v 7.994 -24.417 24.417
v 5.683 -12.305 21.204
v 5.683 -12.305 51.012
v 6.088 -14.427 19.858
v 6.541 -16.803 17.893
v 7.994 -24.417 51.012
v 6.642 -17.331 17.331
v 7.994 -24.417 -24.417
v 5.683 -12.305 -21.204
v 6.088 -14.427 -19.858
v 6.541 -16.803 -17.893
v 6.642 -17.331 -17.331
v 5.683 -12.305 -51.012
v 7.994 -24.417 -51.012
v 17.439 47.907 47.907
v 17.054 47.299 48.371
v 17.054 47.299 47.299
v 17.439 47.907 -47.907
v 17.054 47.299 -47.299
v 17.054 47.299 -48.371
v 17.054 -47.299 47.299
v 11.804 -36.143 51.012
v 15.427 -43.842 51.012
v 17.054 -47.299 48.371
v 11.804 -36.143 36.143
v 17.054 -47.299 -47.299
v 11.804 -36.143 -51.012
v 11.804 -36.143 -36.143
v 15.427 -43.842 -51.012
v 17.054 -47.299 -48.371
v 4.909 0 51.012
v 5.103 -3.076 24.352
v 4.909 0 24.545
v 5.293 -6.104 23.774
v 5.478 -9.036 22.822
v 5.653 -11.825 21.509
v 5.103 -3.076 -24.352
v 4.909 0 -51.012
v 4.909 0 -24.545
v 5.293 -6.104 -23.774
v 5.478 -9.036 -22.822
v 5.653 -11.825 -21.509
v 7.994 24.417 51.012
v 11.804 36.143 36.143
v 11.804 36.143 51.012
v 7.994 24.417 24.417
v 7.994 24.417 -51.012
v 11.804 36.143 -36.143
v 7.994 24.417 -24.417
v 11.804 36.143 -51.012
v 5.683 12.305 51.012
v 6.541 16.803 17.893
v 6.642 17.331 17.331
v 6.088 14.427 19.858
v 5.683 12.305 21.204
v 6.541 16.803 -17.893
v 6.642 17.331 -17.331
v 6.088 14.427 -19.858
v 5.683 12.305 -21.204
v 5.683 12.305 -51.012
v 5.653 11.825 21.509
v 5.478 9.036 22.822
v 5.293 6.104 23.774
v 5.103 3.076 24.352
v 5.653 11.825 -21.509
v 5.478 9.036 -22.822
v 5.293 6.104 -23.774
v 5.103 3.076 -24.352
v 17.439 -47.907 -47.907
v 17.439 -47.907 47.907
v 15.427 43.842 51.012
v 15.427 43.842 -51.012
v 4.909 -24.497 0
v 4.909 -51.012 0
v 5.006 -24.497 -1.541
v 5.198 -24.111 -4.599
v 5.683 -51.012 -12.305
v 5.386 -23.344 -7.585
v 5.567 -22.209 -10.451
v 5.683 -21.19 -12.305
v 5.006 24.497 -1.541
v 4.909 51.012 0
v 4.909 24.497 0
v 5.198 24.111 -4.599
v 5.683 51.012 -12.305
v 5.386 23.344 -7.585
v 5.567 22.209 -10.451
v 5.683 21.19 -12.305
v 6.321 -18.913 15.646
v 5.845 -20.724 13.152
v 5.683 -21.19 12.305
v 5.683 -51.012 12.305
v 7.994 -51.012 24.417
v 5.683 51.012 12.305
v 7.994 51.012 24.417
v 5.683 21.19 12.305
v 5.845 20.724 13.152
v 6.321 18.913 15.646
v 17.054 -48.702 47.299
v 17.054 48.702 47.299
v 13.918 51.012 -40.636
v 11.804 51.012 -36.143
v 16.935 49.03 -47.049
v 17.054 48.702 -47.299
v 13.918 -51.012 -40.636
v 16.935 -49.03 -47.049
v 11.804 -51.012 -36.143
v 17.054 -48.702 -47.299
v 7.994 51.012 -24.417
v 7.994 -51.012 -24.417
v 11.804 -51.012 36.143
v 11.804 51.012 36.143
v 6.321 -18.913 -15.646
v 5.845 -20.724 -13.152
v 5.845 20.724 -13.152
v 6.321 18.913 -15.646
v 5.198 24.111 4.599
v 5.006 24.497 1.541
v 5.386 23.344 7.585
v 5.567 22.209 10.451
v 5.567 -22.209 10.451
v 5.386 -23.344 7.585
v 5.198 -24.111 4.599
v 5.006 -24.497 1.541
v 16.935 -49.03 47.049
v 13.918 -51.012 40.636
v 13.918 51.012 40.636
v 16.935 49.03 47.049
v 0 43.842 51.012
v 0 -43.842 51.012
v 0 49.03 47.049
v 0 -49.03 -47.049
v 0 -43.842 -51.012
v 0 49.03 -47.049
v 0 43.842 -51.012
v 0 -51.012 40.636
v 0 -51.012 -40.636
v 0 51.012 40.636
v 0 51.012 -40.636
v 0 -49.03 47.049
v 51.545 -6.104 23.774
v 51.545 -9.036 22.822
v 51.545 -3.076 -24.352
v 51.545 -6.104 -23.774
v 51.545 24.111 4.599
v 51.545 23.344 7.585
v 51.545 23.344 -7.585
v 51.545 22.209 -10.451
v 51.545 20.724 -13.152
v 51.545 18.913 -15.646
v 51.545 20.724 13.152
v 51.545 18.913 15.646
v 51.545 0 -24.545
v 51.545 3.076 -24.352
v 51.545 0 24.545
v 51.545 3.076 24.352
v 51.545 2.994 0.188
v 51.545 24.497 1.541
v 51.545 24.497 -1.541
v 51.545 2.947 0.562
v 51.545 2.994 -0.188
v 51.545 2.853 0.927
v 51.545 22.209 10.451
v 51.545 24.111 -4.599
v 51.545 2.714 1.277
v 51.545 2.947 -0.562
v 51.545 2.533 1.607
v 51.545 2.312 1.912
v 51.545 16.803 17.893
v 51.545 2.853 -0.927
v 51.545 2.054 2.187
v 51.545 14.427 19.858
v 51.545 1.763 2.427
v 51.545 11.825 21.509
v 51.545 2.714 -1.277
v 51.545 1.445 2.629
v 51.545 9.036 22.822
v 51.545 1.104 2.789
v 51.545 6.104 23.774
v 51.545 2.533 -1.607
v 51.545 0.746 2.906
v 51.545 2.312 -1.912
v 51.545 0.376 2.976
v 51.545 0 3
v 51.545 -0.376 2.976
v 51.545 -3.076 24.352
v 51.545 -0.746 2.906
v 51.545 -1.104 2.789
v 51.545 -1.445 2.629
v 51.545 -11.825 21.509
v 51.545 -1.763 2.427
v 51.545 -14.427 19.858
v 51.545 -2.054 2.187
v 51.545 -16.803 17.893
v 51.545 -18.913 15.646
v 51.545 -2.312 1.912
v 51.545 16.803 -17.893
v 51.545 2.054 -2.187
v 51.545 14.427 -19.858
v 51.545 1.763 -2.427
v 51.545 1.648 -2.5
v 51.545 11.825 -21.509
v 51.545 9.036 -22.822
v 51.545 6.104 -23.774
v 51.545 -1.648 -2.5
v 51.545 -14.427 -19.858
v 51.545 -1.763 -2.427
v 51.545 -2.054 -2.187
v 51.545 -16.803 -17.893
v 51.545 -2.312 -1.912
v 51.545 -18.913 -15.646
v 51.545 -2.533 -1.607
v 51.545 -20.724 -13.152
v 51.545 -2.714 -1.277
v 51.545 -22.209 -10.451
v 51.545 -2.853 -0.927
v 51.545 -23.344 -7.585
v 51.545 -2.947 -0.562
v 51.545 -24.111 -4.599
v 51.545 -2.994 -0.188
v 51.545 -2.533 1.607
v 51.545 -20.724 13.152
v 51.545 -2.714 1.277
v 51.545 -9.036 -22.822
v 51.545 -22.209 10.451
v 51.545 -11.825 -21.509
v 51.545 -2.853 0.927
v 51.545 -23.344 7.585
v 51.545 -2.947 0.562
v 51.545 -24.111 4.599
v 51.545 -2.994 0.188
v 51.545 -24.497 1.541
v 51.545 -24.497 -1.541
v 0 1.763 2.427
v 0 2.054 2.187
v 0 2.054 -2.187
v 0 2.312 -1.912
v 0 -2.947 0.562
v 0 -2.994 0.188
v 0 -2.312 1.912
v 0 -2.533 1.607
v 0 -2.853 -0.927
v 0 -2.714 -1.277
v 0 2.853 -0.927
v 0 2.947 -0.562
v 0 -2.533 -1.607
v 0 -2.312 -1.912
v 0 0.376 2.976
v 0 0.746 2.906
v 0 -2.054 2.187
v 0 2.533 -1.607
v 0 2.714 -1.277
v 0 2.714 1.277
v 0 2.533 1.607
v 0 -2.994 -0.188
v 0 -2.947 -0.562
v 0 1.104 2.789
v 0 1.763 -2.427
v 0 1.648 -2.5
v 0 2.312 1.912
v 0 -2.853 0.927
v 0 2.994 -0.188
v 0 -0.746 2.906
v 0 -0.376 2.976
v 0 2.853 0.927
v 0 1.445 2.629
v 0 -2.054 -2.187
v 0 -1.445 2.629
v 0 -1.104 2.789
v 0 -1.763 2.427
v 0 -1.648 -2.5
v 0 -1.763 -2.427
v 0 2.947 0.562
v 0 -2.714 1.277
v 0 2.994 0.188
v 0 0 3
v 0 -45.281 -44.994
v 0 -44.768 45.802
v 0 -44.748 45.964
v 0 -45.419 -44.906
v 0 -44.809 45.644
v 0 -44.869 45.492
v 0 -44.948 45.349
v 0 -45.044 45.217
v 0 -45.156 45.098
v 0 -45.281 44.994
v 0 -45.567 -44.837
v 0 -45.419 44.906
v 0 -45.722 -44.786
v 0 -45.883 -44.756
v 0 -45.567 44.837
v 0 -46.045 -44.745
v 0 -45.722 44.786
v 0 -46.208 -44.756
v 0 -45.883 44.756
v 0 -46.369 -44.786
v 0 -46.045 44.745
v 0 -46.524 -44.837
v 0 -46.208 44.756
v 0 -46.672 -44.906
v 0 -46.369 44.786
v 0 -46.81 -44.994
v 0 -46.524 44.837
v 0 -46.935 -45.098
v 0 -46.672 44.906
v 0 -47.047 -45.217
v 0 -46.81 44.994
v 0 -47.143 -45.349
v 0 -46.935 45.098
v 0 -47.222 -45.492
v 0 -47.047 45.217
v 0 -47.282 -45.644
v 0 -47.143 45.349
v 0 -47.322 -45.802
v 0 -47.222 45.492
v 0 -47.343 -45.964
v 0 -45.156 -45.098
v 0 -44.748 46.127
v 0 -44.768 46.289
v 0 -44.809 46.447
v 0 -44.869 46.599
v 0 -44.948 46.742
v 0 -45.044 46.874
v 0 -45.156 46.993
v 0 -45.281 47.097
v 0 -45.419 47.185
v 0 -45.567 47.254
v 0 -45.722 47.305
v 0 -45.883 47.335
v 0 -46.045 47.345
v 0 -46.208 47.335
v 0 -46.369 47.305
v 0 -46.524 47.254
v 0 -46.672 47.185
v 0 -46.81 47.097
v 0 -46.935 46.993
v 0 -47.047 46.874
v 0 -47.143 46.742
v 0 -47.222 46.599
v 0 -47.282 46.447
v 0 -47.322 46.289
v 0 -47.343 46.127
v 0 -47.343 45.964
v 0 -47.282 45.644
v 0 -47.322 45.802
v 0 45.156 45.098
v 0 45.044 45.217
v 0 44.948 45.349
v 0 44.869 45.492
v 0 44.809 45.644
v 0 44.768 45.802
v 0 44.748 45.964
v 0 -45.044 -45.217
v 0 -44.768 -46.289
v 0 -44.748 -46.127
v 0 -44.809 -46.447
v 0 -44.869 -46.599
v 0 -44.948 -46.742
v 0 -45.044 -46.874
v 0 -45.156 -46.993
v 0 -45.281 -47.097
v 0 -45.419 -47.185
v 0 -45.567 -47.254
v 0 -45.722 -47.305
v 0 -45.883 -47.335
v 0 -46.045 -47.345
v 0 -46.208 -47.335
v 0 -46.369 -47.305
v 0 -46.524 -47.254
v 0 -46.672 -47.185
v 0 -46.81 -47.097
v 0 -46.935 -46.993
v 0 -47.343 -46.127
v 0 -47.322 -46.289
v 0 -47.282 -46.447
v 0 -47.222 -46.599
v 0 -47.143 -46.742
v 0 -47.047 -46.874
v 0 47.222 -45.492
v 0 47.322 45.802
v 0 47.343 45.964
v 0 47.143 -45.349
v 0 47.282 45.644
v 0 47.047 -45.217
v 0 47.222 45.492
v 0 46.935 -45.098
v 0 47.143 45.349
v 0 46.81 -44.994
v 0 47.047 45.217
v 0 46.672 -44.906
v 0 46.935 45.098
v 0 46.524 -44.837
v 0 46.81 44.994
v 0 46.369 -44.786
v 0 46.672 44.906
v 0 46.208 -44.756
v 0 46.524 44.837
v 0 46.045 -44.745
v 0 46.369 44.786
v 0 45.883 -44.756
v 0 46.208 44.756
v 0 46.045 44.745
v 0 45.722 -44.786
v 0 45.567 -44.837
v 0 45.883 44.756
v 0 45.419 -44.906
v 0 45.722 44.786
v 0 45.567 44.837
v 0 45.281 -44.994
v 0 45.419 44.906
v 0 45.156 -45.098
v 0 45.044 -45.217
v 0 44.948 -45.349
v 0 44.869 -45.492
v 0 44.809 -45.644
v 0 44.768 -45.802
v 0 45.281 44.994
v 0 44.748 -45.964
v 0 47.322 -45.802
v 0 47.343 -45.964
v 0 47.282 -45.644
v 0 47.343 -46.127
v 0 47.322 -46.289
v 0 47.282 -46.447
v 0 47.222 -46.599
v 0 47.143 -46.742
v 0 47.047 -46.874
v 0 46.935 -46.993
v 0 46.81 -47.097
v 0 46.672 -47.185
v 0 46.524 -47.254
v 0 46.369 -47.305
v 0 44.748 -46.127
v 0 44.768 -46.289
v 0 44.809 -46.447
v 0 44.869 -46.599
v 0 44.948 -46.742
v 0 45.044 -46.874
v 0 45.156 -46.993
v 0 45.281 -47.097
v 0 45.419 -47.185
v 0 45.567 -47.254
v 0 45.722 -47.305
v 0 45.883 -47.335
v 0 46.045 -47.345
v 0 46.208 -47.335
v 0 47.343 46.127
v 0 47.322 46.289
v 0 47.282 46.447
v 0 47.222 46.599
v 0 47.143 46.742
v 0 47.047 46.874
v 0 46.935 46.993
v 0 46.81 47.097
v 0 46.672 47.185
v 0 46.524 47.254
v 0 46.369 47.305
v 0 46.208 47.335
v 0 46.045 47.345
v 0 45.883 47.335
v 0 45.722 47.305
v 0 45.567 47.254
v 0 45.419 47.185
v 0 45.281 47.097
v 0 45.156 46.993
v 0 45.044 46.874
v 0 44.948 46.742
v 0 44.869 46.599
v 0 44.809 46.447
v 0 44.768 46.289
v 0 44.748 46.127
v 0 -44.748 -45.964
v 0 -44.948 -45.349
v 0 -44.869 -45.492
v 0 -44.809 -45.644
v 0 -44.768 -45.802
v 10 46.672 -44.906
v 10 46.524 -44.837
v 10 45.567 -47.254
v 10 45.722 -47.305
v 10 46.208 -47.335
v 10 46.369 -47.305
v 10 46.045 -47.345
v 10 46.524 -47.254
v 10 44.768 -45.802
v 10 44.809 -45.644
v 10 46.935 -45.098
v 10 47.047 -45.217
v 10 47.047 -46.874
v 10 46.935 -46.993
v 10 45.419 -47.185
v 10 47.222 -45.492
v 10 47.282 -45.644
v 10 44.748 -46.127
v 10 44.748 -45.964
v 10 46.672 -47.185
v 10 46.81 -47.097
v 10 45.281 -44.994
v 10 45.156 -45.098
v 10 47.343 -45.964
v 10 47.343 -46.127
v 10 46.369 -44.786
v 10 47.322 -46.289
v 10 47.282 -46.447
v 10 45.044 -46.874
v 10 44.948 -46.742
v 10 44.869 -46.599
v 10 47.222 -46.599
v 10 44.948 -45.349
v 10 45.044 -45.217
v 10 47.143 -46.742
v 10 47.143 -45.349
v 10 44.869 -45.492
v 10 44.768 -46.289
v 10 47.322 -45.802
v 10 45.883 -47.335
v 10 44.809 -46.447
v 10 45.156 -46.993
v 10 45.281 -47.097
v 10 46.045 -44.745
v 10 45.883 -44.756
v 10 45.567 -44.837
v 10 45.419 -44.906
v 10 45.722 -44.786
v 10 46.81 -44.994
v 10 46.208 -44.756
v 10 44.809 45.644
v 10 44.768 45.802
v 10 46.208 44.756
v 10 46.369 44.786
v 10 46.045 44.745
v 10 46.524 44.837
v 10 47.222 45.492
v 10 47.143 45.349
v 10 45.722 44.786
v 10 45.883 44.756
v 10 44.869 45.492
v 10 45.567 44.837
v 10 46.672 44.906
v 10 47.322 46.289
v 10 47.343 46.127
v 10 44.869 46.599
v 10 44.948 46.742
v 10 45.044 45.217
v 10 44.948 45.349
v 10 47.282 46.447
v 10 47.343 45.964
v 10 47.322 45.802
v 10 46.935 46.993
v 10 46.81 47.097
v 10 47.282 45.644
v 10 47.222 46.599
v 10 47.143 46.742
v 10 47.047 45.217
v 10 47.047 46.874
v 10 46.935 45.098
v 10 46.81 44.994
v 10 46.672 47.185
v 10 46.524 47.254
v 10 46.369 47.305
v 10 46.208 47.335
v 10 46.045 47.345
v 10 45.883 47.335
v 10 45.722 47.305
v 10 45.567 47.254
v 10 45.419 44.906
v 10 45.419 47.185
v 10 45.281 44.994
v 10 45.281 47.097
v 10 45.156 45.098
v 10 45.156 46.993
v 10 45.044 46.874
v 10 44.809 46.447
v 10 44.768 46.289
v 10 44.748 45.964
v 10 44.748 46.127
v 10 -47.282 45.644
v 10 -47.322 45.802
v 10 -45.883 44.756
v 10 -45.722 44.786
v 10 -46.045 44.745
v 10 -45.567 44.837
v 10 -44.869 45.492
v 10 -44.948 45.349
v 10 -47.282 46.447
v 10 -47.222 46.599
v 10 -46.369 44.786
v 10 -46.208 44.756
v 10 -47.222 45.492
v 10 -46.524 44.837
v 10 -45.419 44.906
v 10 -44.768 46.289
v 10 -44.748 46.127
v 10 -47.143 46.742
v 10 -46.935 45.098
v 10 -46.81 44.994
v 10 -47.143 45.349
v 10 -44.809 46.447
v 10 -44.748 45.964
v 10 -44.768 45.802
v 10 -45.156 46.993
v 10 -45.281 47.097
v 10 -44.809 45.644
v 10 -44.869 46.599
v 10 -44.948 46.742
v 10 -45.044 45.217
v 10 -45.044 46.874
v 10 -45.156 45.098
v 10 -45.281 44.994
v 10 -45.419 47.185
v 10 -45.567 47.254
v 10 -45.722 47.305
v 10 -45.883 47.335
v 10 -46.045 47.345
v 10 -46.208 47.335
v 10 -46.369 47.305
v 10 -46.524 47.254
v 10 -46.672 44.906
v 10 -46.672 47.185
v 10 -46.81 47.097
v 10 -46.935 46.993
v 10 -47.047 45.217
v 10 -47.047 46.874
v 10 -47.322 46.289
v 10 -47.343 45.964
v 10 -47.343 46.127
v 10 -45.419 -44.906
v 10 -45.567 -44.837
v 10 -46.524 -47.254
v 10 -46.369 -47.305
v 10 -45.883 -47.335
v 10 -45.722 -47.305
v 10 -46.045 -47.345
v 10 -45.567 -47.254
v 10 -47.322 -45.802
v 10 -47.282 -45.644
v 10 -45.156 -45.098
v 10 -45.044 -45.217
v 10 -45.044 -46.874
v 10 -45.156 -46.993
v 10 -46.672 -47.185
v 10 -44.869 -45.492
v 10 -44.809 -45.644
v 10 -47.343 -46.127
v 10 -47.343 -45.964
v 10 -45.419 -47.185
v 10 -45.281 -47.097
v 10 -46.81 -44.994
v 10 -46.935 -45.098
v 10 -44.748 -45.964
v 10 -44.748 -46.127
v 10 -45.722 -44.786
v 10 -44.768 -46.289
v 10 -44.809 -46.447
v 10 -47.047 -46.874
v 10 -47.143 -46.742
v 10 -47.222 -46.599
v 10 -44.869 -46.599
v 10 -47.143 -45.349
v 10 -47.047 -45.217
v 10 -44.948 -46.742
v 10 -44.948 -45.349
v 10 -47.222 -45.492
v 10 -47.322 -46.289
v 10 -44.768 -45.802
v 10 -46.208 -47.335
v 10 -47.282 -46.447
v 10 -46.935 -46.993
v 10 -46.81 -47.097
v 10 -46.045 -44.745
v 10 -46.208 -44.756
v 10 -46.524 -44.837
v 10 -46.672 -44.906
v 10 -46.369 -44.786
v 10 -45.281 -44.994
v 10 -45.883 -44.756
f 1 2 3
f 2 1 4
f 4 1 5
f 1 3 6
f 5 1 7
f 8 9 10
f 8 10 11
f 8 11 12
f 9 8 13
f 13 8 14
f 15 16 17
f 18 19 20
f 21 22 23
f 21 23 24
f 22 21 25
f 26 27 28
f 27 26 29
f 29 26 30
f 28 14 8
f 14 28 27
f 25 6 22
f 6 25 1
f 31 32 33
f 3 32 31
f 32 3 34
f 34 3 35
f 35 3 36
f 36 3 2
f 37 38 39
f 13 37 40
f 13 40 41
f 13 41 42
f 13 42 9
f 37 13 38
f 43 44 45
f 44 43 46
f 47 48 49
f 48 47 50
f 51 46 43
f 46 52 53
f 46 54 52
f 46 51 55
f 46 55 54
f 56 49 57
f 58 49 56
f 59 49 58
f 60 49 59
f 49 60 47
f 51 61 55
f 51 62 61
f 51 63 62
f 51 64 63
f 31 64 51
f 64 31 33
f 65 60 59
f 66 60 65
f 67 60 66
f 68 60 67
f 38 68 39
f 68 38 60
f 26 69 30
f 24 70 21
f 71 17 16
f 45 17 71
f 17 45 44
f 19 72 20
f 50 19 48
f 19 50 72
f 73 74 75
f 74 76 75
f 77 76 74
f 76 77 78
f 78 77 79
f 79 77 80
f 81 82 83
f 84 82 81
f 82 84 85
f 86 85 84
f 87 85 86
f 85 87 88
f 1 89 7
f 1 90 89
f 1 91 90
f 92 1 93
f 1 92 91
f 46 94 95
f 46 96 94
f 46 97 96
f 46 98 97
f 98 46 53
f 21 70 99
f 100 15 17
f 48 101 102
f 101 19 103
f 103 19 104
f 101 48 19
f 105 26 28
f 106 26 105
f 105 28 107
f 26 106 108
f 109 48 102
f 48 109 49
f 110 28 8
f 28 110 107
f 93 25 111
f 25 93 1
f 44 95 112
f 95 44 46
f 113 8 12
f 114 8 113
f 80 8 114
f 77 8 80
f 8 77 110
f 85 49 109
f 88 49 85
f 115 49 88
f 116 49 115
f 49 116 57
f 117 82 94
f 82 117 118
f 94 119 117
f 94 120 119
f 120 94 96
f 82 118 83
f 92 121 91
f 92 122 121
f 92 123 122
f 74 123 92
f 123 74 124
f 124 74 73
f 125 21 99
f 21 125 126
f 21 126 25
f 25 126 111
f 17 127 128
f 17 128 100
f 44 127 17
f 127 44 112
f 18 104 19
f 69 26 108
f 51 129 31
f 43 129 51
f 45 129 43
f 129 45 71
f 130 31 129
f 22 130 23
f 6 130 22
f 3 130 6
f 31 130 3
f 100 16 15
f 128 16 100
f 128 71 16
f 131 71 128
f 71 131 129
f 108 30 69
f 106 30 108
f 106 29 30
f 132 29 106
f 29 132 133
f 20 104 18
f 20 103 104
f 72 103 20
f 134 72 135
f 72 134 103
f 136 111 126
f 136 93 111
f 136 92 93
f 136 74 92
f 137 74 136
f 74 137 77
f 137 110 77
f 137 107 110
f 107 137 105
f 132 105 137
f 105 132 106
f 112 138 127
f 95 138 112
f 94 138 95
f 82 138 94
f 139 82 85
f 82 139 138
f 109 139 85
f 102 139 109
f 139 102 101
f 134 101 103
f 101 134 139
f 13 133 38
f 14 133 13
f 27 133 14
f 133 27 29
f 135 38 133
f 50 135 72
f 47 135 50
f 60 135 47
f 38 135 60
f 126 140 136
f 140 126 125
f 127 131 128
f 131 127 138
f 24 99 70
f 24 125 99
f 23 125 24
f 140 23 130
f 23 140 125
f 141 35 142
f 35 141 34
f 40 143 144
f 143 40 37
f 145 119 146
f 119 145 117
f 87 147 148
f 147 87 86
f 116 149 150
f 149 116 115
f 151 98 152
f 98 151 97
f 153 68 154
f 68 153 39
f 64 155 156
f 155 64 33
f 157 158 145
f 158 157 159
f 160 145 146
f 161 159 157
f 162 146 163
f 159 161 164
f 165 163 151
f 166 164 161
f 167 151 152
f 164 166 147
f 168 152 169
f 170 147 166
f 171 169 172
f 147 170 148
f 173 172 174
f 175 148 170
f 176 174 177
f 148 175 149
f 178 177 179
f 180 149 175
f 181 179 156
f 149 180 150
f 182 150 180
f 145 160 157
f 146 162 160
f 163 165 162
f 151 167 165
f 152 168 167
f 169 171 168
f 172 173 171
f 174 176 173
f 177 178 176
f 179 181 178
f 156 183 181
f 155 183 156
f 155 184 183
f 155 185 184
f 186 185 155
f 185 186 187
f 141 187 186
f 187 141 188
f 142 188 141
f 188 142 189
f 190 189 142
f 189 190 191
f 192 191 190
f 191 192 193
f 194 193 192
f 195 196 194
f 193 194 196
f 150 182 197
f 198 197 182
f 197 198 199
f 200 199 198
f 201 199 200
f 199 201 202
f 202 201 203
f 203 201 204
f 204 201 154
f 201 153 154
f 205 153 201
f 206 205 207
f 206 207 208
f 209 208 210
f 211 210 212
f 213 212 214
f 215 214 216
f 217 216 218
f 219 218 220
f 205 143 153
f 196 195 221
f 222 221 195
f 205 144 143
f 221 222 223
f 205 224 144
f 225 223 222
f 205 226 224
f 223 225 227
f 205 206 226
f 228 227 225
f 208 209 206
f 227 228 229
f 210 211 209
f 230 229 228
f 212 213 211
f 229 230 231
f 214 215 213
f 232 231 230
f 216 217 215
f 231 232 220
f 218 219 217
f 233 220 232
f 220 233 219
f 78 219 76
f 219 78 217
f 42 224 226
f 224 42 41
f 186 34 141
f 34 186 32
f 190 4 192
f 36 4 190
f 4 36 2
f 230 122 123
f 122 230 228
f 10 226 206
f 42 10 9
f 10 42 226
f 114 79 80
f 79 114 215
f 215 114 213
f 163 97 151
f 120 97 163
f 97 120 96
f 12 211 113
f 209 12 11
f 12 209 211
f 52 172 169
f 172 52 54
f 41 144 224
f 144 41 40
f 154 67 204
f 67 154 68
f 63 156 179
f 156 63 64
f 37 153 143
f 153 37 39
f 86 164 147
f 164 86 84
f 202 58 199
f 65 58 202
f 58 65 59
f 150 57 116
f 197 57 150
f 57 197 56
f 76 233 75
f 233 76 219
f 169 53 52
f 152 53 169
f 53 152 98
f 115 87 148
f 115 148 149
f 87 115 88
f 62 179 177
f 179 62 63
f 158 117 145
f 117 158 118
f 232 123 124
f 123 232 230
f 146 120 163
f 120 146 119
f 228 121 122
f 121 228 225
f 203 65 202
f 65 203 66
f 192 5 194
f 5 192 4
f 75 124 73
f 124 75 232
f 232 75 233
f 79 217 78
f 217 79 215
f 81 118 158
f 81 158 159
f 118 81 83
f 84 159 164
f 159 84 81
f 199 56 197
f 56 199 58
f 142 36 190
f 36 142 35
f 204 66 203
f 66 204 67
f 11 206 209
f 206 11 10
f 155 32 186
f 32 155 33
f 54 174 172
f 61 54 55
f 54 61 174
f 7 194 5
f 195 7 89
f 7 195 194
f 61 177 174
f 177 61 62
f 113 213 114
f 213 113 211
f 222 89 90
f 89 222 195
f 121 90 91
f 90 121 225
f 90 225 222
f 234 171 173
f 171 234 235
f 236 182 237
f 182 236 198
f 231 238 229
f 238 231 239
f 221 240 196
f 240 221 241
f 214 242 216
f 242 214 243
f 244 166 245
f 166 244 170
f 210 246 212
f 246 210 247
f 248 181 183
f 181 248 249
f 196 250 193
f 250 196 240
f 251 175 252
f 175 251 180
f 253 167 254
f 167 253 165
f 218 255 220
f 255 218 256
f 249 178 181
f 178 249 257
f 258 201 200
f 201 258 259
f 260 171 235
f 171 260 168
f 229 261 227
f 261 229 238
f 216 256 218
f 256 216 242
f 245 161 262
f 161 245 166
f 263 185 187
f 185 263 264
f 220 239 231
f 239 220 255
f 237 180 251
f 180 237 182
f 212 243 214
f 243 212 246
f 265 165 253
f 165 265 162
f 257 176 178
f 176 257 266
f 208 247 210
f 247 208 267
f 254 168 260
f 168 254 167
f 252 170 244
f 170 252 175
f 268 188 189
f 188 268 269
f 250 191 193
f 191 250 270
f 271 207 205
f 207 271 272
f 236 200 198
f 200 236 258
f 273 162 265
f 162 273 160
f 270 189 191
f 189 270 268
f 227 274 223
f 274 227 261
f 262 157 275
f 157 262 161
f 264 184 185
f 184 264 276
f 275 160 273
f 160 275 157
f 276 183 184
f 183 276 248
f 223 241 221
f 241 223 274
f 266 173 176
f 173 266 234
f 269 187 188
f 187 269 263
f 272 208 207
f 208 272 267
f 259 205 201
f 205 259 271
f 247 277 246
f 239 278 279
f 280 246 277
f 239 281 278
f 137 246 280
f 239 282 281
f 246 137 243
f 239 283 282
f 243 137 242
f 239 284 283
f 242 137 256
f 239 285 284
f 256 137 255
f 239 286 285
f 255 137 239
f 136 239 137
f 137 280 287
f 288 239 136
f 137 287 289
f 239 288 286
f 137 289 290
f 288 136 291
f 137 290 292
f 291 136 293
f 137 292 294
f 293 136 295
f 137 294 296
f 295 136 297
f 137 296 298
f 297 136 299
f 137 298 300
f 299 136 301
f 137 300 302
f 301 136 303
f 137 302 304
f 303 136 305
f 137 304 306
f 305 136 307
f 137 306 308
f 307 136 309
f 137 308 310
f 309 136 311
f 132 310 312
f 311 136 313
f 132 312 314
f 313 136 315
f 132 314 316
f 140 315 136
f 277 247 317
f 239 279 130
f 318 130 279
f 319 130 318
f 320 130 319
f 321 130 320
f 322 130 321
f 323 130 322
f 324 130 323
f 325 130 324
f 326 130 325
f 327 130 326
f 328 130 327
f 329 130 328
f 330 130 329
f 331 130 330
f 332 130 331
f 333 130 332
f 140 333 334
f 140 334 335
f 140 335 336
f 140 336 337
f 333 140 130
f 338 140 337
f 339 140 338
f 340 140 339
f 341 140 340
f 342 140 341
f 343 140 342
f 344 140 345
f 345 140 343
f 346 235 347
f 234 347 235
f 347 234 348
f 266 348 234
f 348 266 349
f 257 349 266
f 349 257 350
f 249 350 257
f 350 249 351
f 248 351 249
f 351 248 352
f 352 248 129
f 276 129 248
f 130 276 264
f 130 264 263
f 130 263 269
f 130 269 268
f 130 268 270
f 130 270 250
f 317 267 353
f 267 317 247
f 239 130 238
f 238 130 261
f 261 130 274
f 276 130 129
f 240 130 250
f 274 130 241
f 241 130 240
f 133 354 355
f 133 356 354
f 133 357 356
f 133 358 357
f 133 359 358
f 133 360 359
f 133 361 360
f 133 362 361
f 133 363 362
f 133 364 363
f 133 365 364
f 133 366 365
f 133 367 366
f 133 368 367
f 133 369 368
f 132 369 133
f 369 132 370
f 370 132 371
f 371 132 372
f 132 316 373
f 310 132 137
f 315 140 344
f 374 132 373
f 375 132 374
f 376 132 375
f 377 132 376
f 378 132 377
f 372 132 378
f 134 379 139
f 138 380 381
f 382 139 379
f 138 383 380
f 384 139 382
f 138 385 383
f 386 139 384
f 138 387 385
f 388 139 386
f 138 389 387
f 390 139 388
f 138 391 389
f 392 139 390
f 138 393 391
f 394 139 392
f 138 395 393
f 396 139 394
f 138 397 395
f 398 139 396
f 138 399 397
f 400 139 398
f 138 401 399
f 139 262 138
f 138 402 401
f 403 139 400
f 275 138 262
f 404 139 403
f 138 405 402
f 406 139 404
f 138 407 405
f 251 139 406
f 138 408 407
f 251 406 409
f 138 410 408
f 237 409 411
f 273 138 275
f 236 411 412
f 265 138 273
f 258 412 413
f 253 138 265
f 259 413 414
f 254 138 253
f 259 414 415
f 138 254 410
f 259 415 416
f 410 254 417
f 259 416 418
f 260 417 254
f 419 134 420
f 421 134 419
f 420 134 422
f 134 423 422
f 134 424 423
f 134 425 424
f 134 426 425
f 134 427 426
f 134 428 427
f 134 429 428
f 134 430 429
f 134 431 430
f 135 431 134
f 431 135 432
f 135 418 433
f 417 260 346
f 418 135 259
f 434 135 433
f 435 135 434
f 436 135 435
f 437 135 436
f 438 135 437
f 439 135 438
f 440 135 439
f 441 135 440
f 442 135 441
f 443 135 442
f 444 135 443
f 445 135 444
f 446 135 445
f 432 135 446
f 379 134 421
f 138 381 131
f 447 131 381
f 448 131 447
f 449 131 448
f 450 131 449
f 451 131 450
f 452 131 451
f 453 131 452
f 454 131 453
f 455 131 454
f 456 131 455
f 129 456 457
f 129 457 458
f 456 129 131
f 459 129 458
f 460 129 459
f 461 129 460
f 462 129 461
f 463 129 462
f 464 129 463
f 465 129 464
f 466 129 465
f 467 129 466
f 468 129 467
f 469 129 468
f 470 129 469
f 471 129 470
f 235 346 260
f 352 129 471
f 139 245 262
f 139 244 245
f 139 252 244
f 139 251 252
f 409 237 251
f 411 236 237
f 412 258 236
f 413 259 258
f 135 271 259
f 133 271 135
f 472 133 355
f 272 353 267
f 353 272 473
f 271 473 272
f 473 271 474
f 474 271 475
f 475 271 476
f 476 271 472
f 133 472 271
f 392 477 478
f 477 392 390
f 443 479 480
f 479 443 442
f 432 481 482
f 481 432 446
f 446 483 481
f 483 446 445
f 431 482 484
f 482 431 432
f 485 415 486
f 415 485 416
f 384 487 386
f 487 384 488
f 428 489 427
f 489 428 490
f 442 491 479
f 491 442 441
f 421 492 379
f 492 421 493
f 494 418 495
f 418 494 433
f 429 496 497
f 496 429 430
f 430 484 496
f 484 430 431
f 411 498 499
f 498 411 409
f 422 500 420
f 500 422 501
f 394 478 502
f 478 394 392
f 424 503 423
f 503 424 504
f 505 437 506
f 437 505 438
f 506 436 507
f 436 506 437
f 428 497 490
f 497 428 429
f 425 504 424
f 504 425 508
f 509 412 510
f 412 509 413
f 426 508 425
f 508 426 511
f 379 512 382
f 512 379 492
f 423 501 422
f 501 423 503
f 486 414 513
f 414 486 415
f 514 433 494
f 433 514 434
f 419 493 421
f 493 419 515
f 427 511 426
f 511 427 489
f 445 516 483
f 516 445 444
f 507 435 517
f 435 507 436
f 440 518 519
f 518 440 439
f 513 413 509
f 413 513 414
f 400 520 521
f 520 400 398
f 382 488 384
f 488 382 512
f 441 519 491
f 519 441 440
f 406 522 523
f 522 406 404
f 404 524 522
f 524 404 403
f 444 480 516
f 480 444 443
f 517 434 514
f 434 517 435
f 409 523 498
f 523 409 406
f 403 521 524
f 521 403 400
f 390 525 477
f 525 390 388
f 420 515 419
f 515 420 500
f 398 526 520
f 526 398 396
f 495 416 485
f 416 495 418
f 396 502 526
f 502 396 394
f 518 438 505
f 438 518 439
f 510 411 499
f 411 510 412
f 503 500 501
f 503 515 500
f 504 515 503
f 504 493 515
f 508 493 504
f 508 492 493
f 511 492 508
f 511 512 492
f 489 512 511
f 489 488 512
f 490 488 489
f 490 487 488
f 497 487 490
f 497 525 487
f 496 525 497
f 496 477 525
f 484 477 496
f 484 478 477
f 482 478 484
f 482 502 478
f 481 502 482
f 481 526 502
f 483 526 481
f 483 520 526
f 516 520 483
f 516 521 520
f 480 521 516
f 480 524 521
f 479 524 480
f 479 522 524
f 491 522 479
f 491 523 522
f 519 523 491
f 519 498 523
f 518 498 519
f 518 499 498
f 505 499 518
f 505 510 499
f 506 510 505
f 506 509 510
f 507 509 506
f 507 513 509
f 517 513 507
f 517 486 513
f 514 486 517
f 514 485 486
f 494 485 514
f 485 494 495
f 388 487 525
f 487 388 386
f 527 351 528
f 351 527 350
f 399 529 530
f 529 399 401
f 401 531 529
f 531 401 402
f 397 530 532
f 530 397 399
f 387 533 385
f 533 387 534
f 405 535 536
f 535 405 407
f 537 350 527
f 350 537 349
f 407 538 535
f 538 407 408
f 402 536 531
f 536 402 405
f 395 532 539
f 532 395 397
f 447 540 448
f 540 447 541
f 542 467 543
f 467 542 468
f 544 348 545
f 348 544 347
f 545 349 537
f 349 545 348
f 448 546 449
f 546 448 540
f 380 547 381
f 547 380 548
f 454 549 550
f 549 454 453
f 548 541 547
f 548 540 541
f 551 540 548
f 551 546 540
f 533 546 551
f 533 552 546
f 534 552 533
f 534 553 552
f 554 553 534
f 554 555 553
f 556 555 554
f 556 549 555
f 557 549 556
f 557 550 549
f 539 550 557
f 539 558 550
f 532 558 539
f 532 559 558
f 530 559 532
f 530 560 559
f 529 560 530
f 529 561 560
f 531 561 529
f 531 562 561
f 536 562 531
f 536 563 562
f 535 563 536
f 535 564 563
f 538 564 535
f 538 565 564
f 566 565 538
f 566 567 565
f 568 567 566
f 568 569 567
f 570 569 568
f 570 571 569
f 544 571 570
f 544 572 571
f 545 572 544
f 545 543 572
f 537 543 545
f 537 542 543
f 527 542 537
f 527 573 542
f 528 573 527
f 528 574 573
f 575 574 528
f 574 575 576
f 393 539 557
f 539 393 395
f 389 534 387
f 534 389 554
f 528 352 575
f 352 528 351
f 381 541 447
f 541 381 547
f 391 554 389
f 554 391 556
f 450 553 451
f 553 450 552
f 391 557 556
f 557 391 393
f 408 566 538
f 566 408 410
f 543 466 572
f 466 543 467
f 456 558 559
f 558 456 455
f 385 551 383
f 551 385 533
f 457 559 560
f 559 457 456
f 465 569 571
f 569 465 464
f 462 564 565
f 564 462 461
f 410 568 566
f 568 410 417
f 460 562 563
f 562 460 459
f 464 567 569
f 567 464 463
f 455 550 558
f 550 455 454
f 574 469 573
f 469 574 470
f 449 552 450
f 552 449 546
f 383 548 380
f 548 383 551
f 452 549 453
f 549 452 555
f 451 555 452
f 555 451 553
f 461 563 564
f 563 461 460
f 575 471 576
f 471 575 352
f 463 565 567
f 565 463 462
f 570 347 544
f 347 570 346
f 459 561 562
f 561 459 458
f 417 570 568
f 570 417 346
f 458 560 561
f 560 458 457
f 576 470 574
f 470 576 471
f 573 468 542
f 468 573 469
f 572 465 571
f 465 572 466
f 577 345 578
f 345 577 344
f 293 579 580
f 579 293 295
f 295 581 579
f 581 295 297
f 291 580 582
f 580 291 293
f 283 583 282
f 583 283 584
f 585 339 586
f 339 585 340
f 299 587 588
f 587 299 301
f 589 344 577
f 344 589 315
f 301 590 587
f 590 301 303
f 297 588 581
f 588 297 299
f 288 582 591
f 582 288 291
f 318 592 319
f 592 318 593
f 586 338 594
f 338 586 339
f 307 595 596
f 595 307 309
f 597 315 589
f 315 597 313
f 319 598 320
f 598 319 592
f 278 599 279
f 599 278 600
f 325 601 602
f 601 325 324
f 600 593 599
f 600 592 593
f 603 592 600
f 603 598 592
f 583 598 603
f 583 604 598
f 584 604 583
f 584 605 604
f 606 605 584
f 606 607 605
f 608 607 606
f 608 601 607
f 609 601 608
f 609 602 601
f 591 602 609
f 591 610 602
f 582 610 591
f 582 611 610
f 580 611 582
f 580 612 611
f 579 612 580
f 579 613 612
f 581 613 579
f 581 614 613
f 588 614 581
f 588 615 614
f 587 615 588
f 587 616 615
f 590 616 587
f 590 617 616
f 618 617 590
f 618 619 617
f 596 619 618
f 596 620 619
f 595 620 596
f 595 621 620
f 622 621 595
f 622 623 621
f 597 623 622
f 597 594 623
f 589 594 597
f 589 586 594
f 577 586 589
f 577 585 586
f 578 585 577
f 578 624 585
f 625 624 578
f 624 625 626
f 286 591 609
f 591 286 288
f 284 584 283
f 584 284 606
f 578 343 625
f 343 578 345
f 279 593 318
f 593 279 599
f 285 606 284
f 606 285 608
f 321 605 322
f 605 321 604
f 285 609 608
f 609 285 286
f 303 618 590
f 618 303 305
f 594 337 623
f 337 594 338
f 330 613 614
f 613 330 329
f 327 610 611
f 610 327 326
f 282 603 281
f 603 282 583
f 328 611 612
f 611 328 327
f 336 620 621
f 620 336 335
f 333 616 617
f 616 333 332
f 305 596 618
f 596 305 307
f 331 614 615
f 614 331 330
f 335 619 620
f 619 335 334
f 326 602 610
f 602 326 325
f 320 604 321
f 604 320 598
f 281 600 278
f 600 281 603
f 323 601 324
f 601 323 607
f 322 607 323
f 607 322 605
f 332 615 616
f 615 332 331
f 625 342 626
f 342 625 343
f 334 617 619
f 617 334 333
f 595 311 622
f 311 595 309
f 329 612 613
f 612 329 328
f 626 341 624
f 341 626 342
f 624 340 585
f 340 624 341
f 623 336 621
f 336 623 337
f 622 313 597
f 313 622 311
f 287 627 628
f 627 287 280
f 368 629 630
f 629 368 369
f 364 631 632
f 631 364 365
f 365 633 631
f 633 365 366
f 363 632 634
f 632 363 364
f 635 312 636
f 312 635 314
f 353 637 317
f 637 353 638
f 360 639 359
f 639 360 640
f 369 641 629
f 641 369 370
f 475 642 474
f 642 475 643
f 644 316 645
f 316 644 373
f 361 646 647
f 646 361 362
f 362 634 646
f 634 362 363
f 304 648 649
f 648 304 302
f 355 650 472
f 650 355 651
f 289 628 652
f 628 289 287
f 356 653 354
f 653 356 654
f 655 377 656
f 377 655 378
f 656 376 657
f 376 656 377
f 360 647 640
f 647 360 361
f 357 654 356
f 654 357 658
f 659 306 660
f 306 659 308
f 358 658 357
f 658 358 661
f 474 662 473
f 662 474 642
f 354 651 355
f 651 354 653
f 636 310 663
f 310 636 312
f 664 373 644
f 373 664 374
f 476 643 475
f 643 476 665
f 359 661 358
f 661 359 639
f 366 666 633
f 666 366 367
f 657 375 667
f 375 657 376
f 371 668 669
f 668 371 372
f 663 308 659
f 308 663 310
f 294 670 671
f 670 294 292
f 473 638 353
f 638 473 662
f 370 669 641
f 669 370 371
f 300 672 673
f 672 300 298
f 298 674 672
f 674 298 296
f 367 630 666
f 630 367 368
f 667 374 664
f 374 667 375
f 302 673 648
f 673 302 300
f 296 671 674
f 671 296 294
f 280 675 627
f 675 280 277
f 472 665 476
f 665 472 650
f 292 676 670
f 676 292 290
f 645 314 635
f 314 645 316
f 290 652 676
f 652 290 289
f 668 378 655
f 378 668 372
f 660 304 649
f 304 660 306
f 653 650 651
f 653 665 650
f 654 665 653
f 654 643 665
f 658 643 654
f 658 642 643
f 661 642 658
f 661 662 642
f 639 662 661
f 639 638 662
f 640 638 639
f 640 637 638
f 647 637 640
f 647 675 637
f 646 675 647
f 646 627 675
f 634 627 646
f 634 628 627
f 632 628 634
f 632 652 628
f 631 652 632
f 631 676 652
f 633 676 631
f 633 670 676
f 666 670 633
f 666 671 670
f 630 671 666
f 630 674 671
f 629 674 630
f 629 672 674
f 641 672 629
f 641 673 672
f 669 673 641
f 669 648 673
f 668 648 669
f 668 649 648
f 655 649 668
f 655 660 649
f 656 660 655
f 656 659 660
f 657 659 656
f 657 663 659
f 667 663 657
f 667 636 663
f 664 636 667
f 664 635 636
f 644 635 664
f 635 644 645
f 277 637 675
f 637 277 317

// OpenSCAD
// file: centre_piece_full.scad
include <variables.scad>


module center() 
{
	difference() {
    	difference() 
	    {
	        union() 
	        {
	            difference() {
                
                    difference() 
                    {
                        cubie();
                        translate([CUBIE,0,0])
                            icore();
        
                    }
                    
                    
                    /*translate([0,0,0])
                    scale([0.8,0.8,0.8])
                    difference() 
                    {
                        cubie();
                        translate([CUBIE,0,0])
                            icore();
        
                    }*/
                }                
                
	            rotate([0,90,0])
	                cylinder(CUBIE,r1=INNER,r2=INNER,center=true);
	            if (WITH_RAFT)
	                raft();
	        }
	
	        rotate([0,90,0]) 
	        {
                difference() {
                    cylinder(CUBIE+0.5,r=3,center=true);
                    translate([3-0.5+2.5,0,0]) cube([5,8,CUBIE+0.5],center=true);
                }
                /*union() 
	            {
	                cylinder(CUBIE+0.5,r1=SCREW_BODY+GAP,r2=SCREW_BODY+GAP,center=true);
	
	                translate([0,0,CUBIE/2-1/2-3])
	                    cylinder(1.5,r1=SPRING+GAP,r2=SCREW_BODY+GAP,center=true);
	
	
	                translate([0,0,CUBIE/2-1/2-9.5])
	                    cylinder(1,r1=SCREW_HEAD+GAP,r2=SPRING+GAP,center=true);
	
	
	                translate([0,0,-4.25/2])
	                    cylinder(CUBIE-4.25,r1=SPRING+GAP,r2=SPRING+GAP,center=true);
	
	                translate([0,0,-10.5/2])
	                    cylinder(CUBIE-10,r1=SCREW_HEAD+GAP,r2=SCREW_HEAD+GAP,center=true); 
	            }*/
	        }
	    }
		translate([-CUBIE/2 + tile_height-0.01,0])
		rotate(v=[0,1,0], a=90)
		tile(tile_length*1.05, tile_height);		
	}
}
center();
// file: variables.scad
$fn=50;

scale_factor = 300/55;

CUBIE=18.9*scale_factor; //total side length of each cube piece (including rounded edges)
CORE=18*scale_factor;
SCREW_TIP=1.5*scale_factor;
SCREW_BODY=2*scale_factor;
SCREW_HEAD=3.8*scale_factor;
INNER=4.5*scale_factor;
SPRING=3.2*scale_factor;
ROUND=2*scale_factor; //radius of rounded edges
DEPTH=6*scale_factor;
RAFT=5*scale_factor;
LAYER=0.3*scale_factor;
GAP=0.25*scale_factor;

core_height = 20 * scale_factor;
core_radius = 3 * scale_factor;

WITH_SUPPORT=false;
WITH_RAFT=false;

inner_cubie=(CUBIE-2*ROUND); //length of each cube before rounded edges

tile_length = inner_cubie*0.75;
tile_height = 1 * scale_factor;

module tile(length, height) {
	translate([-length/2,-length/2,0]) {
		minkowski(){
			translate([0,0,-height/2]) cube([length,length,height]);
			cylinder(r=ROUND,h=height,center=true);
		}
	}
	
}

module cubie() {
    translate([-inner_cubie/2,-inner_cubie/2, -inner_cubie/2])
    minkowski() {
        cube([inner_cubie, inner_cubie, inner_cubie]);
        sphere(r=ROUND, $fn=10);
    }
}

module disc() {
    cylinder(CUBIE, r1=CORE, r2=CORE, $fn=50, center=true);

}

module disc2() {
    cylinder(CUBIE*10, r1=CORE, r2=CORE, $fn=50, center=true);

}

module icore() {
    disc();
    rotate([0,90,0])
        disc();
    rotate([90,0,0])
        disc();
}

module core2() {
    intersection() {
        disc2();
        rotate([0,90,0])
            disc2();
        rotate([90,0,0])
            disc2();
    }
}

module screw() {
    translate([5.2,0,0])
    rotate([0,90,0]) {
        cylinder(11.7,r1=SCREW_BODY,r2=SCREW_BODY,$fn=10,center=true);
        translate([0,0,-11.7/2-1.7/2])
            cylinder(1.7,r1=SCREW_HEAD,r2=SCREW_HEAD,$fn=10,center=true);
        translate([0,0,11.7/2+5.7/2])
            cylinder(5.7,r1=SCREW_TIP,r2=SCREW_TIP,$fn=10,center=true);
    }
}
// main file
include <variables.scad>
use <centre_piece_full.scad>

HOLE_RADIUS = 1.3;
HOLE_HEIGHT = 20;

module motor_connector() {
    difference() {
        center();
        translate([-CUBIE/4,0,0])cube(size=[CUBIE/2,CUBIE,CUBIE],center=true);
    }
}

module motor_connector_with_holes() {
    difference() {
        motor_connector();
        rotate([0,90,0]) union() {
            translate([CUBIE/2-5.5,CUBIE/2-5.5,0]) cylinder(r=HOLE_RADIUS, h=HOLE_HEIGHT, center=true);
            translate([-(CUBIE/2-5.5),CUBIE/2-5.5,0]) cylinder(r=HOLE_RADIUS, h=HOLE_HEIGHT, center=true);
            translate([-(CUBIE/2-5.5),-(CUBIE/2-5.5),0]) cylinder(r=HOLE_RADIUS, h=HOLE_HEIGHT, center=true);
            translate([CUBIE/2-5.5,-(CUBIE/2-5.5),0]) cylinder(r=HOLE_RADIUS, h=HOLE_HEIGHT, center=true);
        }
    }
}

motor_connector_with_holes();
